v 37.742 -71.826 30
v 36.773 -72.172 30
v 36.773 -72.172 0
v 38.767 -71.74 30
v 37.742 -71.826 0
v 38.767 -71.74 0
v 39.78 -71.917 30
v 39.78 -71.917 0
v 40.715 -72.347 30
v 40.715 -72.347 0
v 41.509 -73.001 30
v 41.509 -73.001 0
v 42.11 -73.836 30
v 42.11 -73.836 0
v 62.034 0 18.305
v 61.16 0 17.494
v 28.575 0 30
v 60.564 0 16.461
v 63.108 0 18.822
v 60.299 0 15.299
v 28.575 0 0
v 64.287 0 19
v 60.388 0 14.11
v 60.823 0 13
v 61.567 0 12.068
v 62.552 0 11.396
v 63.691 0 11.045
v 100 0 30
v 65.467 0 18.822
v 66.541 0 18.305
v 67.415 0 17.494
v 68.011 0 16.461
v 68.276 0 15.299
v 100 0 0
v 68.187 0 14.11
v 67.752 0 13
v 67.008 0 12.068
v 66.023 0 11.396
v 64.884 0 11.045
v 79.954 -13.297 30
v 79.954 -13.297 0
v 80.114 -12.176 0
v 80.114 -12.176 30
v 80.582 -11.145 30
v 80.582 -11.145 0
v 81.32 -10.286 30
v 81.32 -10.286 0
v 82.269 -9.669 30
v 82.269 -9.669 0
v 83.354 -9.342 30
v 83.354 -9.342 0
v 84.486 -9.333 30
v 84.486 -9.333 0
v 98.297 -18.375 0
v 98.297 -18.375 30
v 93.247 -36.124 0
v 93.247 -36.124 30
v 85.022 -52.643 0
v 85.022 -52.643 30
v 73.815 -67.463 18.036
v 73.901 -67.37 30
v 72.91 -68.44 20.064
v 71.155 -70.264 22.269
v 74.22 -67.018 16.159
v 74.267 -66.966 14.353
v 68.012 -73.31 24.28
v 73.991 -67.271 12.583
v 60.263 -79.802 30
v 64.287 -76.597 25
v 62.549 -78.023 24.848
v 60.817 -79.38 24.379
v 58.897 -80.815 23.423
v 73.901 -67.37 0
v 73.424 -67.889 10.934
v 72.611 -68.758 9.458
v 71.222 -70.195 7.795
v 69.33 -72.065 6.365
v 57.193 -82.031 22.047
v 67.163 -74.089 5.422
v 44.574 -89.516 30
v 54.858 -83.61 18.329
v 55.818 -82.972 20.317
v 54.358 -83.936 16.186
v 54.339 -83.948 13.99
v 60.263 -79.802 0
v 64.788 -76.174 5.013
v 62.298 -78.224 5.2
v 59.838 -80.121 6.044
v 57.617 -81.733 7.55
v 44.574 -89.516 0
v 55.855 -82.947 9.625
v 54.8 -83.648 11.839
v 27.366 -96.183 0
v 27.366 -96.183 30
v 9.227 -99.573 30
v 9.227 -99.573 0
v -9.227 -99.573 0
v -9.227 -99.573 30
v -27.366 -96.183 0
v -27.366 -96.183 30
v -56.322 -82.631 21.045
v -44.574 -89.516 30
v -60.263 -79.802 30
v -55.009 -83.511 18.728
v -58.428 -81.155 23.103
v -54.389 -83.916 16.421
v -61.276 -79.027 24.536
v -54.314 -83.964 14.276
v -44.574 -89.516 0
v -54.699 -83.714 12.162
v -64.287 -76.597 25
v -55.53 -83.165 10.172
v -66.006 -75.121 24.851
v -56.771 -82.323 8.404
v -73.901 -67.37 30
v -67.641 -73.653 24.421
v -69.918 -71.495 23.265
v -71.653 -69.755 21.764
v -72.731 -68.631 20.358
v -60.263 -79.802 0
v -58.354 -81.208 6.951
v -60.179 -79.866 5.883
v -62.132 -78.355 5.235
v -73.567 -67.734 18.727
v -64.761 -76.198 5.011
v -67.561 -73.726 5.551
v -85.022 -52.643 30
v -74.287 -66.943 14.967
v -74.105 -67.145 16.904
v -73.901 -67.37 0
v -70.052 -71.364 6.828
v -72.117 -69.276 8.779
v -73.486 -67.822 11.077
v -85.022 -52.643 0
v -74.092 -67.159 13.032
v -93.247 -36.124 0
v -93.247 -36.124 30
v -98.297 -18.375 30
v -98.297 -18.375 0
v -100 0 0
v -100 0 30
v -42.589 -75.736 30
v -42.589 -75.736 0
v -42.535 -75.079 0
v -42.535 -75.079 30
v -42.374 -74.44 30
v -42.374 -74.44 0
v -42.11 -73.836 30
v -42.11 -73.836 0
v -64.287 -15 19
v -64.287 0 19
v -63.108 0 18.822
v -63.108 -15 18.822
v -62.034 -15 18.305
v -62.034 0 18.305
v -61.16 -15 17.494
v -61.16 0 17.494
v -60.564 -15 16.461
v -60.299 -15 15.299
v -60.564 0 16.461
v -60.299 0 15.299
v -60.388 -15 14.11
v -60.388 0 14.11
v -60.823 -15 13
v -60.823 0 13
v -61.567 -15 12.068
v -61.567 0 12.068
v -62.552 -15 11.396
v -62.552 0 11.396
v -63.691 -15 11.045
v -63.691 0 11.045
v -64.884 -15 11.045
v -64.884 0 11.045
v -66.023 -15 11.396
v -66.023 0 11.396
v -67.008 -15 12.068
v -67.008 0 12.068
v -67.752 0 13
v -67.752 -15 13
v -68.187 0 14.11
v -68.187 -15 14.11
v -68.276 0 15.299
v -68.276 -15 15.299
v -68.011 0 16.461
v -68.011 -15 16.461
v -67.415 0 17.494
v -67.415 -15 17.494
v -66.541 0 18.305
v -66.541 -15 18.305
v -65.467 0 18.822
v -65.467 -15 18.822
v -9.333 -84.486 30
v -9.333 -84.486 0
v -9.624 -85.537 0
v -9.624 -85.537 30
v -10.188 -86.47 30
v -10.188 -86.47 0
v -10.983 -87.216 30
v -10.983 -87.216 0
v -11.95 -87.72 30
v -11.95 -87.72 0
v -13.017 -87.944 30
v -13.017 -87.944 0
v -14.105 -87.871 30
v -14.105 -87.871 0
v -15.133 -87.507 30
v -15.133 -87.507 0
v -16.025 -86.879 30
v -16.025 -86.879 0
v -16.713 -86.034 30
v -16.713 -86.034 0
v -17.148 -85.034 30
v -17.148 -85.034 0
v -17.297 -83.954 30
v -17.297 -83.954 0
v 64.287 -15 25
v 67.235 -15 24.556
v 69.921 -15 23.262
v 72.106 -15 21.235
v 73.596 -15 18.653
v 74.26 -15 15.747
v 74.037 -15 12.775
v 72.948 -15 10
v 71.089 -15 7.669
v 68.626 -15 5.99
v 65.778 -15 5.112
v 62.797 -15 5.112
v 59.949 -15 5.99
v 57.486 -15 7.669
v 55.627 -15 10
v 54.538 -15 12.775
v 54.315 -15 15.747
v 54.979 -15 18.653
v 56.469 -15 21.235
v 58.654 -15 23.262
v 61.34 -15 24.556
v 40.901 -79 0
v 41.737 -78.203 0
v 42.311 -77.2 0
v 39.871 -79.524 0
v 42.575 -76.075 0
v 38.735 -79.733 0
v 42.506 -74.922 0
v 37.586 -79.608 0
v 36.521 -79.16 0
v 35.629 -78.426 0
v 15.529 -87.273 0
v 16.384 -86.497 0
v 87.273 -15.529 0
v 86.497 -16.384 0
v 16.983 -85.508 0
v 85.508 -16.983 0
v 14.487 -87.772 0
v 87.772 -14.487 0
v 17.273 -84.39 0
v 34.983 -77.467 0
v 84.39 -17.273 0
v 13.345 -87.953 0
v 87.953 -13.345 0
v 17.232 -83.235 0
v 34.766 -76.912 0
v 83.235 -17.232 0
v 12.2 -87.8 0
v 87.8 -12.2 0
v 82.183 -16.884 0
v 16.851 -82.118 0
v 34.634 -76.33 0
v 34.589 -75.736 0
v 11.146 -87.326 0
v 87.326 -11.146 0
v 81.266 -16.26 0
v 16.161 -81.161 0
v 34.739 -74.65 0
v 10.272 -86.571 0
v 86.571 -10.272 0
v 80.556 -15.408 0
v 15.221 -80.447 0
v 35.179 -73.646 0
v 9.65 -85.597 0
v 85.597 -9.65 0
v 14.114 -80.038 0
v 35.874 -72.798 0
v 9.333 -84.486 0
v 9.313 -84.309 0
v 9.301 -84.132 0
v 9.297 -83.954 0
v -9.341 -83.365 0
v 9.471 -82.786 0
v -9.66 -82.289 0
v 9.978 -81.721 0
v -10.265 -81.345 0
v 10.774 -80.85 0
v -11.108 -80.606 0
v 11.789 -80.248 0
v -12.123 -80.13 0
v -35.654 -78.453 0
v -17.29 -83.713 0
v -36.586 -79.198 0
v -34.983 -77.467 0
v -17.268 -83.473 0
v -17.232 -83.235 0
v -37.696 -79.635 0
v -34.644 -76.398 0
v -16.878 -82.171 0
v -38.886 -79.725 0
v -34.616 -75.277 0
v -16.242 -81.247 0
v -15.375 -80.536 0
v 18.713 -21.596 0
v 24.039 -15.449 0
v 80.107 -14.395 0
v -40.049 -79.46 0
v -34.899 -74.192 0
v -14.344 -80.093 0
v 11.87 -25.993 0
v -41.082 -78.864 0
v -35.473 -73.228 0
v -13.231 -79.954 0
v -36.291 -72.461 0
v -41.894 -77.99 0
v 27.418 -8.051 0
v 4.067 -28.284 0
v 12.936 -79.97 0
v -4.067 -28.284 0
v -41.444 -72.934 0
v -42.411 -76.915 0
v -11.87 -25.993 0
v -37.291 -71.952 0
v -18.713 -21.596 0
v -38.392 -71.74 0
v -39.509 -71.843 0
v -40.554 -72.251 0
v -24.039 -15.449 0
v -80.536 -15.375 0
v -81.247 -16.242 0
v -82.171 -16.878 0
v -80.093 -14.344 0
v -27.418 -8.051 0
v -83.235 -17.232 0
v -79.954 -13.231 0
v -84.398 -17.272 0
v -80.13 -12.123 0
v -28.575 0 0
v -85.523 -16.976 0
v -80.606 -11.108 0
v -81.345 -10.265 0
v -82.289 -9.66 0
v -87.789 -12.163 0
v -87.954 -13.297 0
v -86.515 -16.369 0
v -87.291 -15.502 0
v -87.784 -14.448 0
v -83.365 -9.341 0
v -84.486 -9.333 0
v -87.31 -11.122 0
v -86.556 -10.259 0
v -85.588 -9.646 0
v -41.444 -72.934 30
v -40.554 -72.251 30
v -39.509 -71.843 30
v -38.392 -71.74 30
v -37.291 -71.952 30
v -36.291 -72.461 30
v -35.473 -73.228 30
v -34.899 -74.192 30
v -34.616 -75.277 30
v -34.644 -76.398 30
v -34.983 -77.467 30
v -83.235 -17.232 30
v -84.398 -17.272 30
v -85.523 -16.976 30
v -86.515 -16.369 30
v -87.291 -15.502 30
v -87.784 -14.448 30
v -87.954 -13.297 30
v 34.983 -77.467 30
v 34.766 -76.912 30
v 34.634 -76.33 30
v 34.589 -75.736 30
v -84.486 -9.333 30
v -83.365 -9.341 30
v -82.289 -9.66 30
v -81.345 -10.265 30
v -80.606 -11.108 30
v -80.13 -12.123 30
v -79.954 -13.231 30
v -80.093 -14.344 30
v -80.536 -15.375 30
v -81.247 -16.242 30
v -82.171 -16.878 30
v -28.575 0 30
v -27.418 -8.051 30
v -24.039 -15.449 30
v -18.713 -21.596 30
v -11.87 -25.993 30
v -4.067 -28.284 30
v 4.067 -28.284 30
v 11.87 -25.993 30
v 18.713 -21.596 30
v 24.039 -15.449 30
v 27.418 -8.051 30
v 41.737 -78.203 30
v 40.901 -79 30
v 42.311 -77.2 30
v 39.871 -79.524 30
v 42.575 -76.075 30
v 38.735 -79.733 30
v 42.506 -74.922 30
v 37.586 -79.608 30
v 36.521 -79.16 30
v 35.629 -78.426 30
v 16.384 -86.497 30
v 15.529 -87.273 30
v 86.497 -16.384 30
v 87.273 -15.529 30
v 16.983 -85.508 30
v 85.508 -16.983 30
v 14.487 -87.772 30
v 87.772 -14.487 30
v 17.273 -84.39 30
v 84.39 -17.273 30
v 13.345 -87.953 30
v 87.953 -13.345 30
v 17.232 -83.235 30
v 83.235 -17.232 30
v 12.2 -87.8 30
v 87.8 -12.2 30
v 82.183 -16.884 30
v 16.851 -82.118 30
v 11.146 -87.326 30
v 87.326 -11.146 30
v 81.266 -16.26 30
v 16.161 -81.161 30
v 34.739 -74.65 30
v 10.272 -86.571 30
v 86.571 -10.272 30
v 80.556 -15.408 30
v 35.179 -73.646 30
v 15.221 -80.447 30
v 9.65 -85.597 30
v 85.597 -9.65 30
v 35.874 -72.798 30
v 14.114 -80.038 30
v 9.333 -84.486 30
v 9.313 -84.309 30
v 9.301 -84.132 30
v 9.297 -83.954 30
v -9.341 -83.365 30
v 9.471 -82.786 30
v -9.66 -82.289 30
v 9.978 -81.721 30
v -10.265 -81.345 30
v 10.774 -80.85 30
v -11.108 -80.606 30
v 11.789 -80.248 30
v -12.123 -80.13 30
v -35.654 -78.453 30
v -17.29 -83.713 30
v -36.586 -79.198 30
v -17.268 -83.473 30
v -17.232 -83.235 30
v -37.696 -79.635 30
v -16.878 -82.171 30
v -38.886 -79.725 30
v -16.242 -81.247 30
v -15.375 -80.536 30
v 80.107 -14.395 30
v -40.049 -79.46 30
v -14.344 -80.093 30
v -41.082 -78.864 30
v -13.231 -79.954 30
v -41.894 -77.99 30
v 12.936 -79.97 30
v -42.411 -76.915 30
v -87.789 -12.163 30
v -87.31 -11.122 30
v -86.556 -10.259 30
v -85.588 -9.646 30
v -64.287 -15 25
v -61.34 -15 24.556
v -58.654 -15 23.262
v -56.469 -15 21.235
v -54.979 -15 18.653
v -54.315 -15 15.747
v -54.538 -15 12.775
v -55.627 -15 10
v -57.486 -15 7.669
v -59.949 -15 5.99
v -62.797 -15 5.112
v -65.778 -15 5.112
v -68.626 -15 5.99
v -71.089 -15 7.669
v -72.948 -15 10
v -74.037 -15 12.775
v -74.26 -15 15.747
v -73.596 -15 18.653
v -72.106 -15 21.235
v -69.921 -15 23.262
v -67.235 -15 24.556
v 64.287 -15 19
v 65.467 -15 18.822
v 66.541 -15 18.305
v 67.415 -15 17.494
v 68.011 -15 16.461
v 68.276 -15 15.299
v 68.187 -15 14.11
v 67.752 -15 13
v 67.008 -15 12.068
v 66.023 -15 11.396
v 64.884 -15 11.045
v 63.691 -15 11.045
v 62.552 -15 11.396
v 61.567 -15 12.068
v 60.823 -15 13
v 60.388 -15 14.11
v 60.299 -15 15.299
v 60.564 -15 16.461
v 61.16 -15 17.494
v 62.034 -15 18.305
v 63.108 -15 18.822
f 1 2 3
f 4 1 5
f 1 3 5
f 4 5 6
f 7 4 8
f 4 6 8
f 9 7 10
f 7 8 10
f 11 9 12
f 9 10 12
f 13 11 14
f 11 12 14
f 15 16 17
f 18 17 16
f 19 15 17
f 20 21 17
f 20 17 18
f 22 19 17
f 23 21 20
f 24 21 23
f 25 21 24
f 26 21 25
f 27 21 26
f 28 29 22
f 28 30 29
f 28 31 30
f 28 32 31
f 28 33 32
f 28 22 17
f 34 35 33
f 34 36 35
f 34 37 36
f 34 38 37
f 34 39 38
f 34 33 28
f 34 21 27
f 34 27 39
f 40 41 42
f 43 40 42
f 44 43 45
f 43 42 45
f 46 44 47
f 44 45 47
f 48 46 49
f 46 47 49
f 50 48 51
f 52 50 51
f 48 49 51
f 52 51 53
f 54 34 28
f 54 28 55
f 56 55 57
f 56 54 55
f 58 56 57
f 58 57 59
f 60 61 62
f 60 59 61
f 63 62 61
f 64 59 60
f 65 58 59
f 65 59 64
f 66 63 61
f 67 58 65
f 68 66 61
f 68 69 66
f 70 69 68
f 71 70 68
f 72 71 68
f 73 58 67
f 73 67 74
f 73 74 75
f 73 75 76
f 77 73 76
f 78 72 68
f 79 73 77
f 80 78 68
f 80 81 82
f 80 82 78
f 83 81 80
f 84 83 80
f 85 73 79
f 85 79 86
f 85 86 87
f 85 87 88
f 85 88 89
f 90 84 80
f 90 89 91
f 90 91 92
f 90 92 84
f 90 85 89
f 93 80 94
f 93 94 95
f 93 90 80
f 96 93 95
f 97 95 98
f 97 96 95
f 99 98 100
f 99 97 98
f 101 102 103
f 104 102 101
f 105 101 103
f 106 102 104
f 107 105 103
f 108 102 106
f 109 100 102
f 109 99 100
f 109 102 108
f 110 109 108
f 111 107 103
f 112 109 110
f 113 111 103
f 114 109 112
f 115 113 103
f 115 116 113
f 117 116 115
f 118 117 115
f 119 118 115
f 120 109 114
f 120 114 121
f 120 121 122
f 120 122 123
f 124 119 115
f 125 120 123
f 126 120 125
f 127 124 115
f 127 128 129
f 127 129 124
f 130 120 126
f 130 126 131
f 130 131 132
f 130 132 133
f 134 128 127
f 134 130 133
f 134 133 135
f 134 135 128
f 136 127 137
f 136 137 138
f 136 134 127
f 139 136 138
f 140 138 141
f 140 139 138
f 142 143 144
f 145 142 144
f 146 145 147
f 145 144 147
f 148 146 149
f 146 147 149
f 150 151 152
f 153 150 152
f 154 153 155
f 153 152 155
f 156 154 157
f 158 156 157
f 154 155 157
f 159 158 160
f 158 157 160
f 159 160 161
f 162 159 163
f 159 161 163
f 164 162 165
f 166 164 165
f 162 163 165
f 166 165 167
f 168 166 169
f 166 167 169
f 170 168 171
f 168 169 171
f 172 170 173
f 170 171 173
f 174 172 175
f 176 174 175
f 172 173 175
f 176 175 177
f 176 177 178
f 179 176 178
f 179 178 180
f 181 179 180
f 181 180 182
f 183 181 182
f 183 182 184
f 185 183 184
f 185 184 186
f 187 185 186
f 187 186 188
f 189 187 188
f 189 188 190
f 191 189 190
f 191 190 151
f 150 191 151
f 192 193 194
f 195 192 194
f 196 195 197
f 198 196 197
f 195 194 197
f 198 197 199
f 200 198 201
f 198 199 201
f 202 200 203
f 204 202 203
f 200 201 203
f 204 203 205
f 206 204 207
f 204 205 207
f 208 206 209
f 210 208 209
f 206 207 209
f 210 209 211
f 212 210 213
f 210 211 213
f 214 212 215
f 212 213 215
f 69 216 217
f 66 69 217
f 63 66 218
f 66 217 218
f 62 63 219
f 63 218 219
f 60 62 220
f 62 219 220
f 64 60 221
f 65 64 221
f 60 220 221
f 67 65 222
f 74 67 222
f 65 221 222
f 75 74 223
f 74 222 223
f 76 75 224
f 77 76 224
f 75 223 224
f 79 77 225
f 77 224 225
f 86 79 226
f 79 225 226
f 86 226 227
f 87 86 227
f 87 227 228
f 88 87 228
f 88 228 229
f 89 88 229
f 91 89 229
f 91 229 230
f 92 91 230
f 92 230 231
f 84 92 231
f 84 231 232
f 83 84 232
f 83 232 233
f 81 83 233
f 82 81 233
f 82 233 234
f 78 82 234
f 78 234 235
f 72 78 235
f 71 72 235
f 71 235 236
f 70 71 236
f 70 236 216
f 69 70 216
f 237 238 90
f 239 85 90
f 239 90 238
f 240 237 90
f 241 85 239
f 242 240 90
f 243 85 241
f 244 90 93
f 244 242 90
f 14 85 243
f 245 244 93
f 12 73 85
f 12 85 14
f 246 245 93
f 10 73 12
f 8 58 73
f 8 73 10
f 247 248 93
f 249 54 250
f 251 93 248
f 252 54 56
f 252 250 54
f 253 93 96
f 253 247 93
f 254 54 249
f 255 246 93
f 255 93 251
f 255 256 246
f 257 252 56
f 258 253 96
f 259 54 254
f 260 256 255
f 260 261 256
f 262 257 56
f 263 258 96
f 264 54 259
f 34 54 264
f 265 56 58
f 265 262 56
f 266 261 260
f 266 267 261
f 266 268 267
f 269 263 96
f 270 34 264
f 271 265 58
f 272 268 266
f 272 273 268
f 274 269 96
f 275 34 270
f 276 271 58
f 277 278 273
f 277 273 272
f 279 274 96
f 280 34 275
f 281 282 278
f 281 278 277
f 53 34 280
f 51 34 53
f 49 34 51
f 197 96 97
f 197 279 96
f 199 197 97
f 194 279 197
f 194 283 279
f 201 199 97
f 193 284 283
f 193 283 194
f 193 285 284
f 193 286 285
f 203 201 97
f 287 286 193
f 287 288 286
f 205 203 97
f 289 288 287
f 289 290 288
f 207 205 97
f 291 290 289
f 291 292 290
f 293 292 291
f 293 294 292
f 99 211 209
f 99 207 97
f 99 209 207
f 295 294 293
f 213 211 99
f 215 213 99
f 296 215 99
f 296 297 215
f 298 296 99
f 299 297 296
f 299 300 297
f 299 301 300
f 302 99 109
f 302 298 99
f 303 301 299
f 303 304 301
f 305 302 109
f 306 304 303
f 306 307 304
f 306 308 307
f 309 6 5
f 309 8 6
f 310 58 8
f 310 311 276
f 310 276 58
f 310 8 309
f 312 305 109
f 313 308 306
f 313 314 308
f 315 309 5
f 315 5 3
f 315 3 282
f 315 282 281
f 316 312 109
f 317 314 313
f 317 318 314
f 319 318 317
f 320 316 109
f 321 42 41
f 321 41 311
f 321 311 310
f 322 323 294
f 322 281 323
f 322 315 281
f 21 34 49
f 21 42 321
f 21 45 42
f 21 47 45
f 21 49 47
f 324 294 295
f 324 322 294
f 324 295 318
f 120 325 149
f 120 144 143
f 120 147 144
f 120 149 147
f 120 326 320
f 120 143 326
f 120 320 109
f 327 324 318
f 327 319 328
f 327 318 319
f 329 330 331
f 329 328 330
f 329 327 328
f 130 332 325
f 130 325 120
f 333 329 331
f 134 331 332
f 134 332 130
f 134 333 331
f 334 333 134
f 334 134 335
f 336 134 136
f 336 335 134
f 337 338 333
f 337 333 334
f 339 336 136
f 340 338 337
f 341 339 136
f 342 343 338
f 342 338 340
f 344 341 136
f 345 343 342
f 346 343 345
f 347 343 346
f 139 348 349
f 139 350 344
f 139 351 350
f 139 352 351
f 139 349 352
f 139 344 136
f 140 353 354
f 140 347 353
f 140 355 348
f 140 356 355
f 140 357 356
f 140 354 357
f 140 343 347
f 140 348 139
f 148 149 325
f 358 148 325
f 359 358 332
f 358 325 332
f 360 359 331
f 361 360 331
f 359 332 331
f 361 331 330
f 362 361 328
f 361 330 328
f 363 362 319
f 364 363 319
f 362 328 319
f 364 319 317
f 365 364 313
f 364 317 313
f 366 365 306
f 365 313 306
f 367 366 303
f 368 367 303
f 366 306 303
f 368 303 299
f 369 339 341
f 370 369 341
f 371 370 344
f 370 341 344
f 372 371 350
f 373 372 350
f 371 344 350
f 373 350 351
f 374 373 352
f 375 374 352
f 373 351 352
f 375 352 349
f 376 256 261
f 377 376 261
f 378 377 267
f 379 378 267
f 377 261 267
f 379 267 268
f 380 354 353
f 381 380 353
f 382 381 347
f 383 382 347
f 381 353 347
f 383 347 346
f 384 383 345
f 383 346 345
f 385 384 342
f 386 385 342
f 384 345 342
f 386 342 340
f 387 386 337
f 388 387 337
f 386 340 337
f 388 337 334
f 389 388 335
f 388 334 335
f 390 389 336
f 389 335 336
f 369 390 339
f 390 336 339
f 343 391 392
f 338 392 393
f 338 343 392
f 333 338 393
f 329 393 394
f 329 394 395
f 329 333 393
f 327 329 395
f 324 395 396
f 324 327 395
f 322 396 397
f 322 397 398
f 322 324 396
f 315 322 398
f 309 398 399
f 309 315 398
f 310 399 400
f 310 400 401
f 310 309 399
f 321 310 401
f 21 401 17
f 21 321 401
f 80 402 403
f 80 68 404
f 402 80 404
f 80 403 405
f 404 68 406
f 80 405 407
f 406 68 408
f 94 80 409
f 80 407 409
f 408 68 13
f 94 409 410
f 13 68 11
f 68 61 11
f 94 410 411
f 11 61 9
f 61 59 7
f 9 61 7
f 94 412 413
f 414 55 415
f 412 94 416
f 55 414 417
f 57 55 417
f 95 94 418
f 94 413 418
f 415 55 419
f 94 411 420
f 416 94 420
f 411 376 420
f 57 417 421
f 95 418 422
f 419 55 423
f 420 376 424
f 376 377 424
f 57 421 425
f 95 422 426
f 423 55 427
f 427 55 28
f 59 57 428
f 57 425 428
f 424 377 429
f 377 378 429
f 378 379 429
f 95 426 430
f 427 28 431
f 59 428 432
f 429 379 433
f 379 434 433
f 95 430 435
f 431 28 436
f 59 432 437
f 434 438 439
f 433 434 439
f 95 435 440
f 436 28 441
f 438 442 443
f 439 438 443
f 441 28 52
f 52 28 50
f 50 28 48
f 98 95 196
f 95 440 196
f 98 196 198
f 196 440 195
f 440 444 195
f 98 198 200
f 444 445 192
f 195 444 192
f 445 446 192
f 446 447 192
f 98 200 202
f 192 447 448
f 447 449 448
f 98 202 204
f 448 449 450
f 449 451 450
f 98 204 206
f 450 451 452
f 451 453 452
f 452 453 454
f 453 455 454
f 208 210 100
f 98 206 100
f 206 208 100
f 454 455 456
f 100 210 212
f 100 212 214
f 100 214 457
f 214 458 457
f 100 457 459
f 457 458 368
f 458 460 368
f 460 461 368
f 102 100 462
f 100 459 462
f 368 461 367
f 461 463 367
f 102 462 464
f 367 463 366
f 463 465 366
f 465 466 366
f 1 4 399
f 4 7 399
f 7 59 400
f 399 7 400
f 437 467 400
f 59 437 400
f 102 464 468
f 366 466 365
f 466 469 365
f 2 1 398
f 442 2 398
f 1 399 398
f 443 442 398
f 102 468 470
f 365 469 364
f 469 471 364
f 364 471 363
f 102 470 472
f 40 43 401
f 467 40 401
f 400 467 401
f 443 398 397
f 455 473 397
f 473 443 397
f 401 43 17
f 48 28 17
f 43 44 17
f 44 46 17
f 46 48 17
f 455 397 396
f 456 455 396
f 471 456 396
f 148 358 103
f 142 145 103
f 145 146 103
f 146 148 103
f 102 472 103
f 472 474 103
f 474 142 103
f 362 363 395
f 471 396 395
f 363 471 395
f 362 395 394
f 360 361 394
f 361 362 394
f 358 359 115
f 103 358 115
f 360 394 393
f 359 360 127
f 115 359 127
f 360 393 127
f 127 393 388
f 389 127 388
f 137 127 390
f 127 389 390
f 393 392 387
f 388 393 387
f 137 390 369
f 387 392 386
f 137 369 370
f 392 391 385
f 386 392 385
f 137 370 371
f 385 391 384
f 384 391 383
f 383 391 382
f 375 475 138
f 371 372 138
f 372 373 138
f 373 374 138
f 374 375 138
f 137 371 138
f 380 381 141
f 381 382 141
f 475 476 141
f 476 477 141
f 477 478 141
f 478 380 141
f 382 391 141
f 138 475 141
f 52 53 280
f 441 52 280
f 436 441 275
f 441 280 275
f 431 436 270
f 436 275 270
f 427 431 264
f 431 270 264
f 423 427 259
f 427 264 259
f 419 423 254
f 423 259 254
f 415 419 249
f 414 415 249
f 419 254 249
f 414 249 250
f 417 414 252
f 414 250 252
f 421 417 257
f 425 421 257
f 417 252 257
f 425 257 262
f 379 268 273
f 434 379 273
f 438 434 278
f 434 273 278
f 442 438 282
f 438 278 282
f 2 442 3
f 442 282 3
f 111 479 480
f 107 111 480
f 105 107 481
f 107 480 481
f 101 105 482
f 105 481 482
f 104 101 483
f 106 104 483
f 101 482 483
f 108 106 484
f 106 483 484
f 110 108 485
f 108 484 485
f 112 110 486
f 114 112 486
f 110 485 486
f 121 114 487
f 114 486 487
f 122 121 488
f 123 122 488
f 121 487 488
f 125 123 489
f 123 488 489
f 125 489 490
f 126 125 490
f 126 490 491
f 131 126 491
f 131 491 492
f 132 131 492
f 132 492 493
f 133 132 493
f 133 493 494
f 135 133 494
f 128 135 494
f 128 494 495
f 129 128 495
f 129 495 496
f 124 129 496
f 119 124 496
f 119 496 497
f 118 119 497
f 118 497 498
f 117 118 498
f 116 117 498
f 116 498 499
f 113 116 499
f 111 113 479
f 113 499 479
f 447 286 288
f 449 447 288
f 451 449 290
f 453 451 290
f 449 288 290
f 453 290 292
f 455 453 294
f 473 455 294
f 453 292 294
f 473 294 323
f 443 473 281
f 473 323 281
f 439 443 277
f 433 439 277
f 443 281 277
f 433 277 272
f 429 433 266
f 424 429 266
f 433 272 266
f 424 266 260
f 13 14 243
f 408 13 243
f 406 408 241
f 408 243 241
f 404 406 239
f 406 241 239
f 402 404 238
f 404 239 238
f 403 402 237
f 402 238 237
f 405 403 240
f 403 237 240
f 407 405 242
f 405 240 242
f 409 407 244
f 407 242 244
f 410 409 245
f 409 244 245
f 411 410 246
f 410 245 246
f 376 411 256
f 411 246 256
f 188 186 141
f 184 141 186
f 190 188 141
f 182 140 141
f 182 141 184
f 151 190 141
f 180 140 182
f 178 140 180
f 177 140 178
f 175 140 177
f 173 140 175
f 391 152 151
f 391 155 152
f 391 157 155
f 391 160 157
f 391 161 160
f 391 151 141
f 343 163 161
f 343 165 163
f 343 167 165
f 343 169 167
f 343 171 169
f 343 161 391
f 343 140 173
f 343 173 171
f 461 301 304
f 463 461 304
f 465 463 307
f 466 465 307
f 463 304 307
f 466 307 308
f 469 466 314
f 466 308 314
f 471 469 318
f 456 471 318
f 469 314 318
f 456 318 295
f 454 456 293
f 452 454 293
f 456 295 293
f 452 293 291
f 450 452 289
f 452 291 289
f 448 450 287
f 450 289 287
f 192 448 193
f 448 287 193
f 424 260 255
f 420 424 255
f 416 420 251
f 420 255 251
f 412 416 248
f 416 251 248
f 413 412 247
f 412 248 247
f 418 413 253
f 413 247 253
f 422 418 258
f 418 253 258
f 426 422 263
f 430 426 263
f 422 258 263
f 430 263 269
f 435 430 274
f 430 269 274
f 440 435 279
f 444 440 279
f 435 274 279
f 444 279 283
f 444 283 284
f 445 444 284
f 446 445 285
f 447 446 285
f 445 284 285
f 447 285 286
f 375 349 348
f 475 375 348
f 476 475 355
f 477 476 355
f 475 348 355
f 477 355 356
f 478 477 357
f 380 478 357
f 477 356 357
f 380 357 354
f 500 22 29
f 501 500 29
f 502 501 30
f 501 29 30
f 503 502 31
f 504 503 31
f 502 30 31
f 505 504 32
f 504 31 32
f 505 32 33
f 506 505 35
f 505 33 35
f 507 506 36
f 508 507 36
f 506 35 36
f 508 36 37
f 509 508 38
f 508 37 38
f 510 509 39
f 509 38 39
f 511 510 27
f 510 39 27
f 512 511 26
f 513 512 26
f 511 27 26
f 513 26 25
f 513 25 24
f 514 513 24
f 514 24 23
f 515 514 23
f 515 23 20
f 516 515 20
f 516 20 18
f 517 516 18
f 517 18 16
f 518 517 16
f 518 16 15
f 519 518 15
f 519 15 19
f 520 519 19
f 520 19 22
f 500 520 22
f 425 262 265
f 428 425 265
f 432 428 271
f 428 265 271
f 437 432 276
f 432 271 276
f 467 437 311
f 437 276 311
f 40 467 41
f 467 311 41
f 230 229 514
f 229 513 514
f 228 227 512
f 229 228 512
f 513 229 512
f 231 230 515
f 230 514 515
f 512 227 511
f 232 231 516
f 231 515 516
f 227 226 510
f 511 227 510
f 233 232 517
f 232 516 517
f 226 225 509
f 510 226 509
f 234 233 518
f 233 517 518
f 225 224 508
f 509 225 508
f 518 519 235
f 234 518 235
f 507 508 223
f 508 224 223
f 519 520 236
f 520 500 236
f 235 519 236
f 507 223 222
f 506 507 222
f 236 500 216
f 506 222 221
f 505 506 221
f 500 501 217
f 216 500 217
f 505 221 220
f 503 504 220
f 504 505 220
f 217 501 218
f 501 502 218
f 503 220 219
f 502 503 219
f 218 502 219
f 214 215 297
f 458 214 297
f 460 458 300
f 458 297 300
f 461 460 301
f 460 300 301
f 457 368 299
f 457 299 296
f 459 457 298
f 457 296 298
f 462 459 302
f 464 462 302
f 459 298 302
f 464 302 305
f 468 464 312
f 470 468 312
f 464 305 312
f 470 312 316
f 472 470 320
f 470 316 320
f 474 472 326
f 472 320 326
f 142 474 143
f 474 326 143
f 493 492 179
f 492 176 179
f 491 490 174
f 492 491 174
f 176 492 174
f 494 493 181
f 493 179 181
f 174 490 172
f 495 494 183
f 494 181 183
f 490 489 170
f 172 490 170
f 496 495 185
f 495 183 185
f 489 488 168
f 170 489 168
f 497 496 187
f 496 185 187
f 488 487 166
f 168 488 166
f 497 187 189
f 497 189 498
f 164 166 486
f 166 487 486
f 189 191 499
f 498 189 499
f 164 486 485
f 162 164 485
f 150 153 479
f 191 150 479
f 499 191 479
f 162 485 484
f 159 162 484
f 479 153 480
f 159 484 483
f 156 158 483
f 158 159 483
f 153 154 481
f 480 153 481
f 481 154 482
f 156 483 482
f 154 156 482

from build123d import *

# Parameters (mm, degrees)
DODANIE_WYCI_GNI_CIE1_DEPTH = 30
SZKIC2_R                    = 4
WYTNIJ_WYCI_GNI_CIE1_DEPTH  = 145.568322948
SZKIC3_R                    = 10
WYTNIJ_WYCI_GNI_CIE2_DEPTH  = 135.629120338
WYTNIJ_WYCI_GNI_CIE5_DEPTH  = 145.568323107


with BuildPart() as part:
    # Szkic1 → Dodanie-wyciągnięcie1 (new body)
    with BuildSketch(Plane.XY):
        with BuildLine():
            Line((-100, 0), (-28.575, 0))
            ThreePointArc((-28.575, 0), (0, -28.575), (28.575, 0))
            Line((28.575, 0), (100, 0))
            ThreePointArc((100, 0), (0, -100), (-100, 0))
        make_face()
    extrude(amount=DODANIE_WYCI_GNI_CIE1_DEPTH)

    # Szkic2 → Wytnij-wyciągnięcie1 (cut, through all)
    with BuildSketch(Plane(origin=(0, 0, 0), x_dir=(1, 0, 0), z_dir=(0, 1, 0))):
        with Locations(Location((-64.2875, -15, 0), (0, 0, 270))):
            Circle(SZKIC2_R)
        with Locations(Location((64.2875, -15, 0), (0, 0, 270))):
            Circle(SZKIC2_R)
    extrude(amount=-WYTNIJ_WYCI_GNI_CIE1_DEPTH, mode=Mode.SUBTRACT)

    # Szkic3 → Wytnij-wyciągnięcie2 (cut, through all)
    with BuildSketch(Plane(origin=(0, -15, 0), x_dir=(1, 0, 0), z_dir=(0, 1, 0))):
        with Locations(Location((64.2875, -15, 0), (0, 0, 270))):
            Circle(SZKIC3_R)
        with Locations(Location((-64.2875, -15, 0), (0, 0, 270))):
            Circle(SZKIC3_R)
    extrude(amount=-WYTNIJ_WYCI_GNI_CIE2_DEPTH, mode=Mode.SUBTRACT)

    # Szkic5 → Wytnij-wyciągnięcie5 (cut, through all)
    with BuildSketch(Plane(origin=(0, 0, 0), x_dir=(-1, 0, 0), z_dir=(0, 0, -1))):
        with BuildLine():
            ThreePointArc((84.486114669, -9.332546708), (80.002755588, -12.671191668), (83.234985426, -17.231865861))
            ThreePointArc((83.234985426, -17.231865861), (83.953508951, -13.296929528), (84.486114669, -9.332546708))
        make_face()
        with BuildLine():
            ThreePointArc((84.486114669, -9.332546708), (83.953508951, -13.296929528), (83.234985426, -17.231865861))
            ThreePointArc((83.234985426, -17.231865861), (86.515335048, -16.368907238), (87.953508951, -13.296929528))
            ThreePointArc((87.953508951, -13.296929528), (86.964357907, -10.663530857), (84.486114669, -9.332546708))
        make_face()
        with BuildLine():
            ThreePointArc((84.486114669, -9.332546708), (80.002755588, -12.671191668), (83.234985426, -17.231865861))
            ThreePointArc((83.234985426, -17.231865861), (83.953508951, -13.296929528), (84.486114669, -9.332546708))
        make_face()
        with BuildLine():
            ThreePointArc((84.486114669, -9.332546708), (83.953508951, -13.296929528), (83.234985426, -17.231865861))
            ThreePointArc((83.234985426, -17.231865861), (86.515335048, -16.368907238), (87.953508951, -13.296929528))
            ThreePointArc((87.953508951, -13.296929528), (86.964357907, -10.663530857), (84.486114669, -9.332546708))
        make_face()
        with BuildLine():
            ThreePointArc((42.109503339, -73.836235878), (36.773230479, -72.171528459), (34.983424582, -77.467154359))
            ThreePointArc((34.983424582, -77.467154359), (38.589192478, -75.735554556), (42.109503339, -73.836235878))
        make_face()
        with BuildLine():
            ThreePointArc((42.109503339, -73.836235878), (38.589192478, -75.735554556), (34.983424582, -77.467154359))
            ThreePointArc((34.983424582, -77.467154359), (39.477147549, -79.635751447), (42.589192478, -75.735554556))
            ThreePointArc((42.589192478, -75.735554556), (42.46741652, -74.756075981), (42.109503339, -73.836235878))
        make_face()
        with BuildLine():
            ThreePointArc((42.109503339, -73.836235878), (36.773230479, -72.171528459), (34.983424582, -77.467154359))
            ThreePointArc((34.983424582, -77.467154359), (38.589192478, -75.735554556), (42.109503339, -73.836235878))
        make_face()
        with BuildLine():
            ThreePointArc((42.109503339, -73.836235878), (38.589192478, -75.735554556), (34.983424582, -77.467154359))
            ThreePointArc((34.983424582, -77.467154359), (39.477147549, -79.635751447), (42.589192478, -75.735554556))
            ThreePointArc((42.589192478, -75.735554556), (42.46741652, -74.756075981), (42.109503339, -73.836235878))
        make_face()
        with BuildLine():
            ThreePointArc((17.231865861, -83.234985426), (12.671191668, -80.002755588), (9.332546708, -84.486114669))
            ThreePointArc((9.332546708, -84.486114669), (13.296929528, -83.953508951), (17.231865861, -83.234985426))
        make_face()
        with BuildLine():
            ThreePointArc((17.231865861, -83.234985426), (13.296929528, -83.953508951), (9.332546708, -84.486114669))
            ThreePointArc((9.332546708, -84.486114669), (13.563827184, -87.944594723), (17.296929528, -83.953508951))
            ThreePointArc((17.296929528, -83.953508951), (17.280630404, -83.592777286), (17.231865861, -83.234985426))
        make_face()
        with BuildLine():
            ThreePointArc((17.231865861, -83.234985426), (12.671191668, -80.002755588), (9.332546708, -84.486114669))
            ThreePointArc((9.332546708, -84.486114669), (13.296929528, -83.953508951), (17.231865861, -83.234985426))
        make_face()
        with BuildLine():
            ThreePointArc((17.231865861, -83.234985426), (13.296929528, -83.953508951), (9.332546708, -84.486114669))
            ThreePointArc((9.332546708, -84.486114669), (13.563827184, -87.944594723), (17.296929528, -83.953508951))
            ThreePointArc((17.296929528, -83.953508951), (17.280630404, -83.592777286), (17.231865861, -83.234985426))
        make_face()
        with BuildLine():
            ThreePointArc((-17.231865861, -83.234985426), (-13.296929528, -83.953508951), (-9.332546708, -84.486114669))
            ThreePointArc((-9.332546708, -84.486114669), (-9.305843756, -84.220406607), (-9.296929528, -83.953508951))
            ThreePointArc((-9.296929528, -83.953508951), (-12.936197864, -79.969808075), (-17.231865861, -83.234985426))
        make_face()
        with BuildLine():
            ThreePointArc((-17.231865861, -83.234985426), (-13.922667389, -87.904262313), (-9.332546708, -84.486114669))
            ThreePointArc((-9.332546708, -84.486114669), (-13.296929528, -83.953508951), (-17.231865861, -83.234985426))
        make_face()
        with BuildLine():
            ThreePointArc((-17.231865861, -83.234985426), (-13.296929528, -83.953508951), (-9.332546708, -84.486114669))
            ThreePointArc((-9.332546708, -84.486114669), (-9.305843756, -84.220406607), (-9.296929528, -83.953508951))
            ThreePointArc((-9.296929528, -83.953508951), (-12.936197864, -79.969808075), (-17.231865861, -83.234985426))
        make_face()
        with BuildLine():
            ThreePointArc((-17.231865861, -83.234985426), (-13.922667389, -87.904262313), (-9.332546708, -84.486114669))
            ThreePointArc((-9.332546708, -84.486114669), (-13.296929528, -83.953508951), (-17.231865861, -83.234985426))
        make_face()
        with BuildLine():
            ThreePointArc((-34.983424582, -77.467154359), (-36.796495821, -76.622567794), (-38.589192478, -75.735554556))
            ThreePointArc((-38.589192478, -75.735554556), (-40.360521918, -74.806605795), (-42.109503339, -73.836235878))
            ThreePointArc((-42.109503339, -73.836235878), (-40.405154477, -79.299580653), (-34.983424582, -77.467154359))
        make_face()
        with BuildLine():
            ThreePointArc((-34.589192478, -75.735554556), (-35.17863182, -73.645560297), (-36.773230479, -72.171528459))
            Line((-36.773230479, -72.171528459), (-38.589192478, -75.735554556))
            ThreePointArc((-38.589192478, -75.735554556), (-36.796495821, -76.622567794), (-34.983424582, -77.467154359))
            ThreePointArc((-34.983424582, -77.467154359), (-34.688995586, -76.623509627), (-34.589192478, -75.735554556))
        make_face()
        with BuildLine():
            Line((-38.589192478, -75.735554556), (-36.773230479, -72.171528459))
            ThreePointArc((-36.773230479, -72.171528459), (-39.780416201, -71.917048822), (-42.109503339, -73.836235878))
            ThreePointArc((-42.109503339, -73.836235878), (-40.360521918, -74.806605795), (-38.589192478, -75.735554556))
        make_face()
        with BuildLine():
            ThreePointArc((-34.589192478, -75.735554556), (-35.17863182, -73.645560297), (-36.773230479, -72.171528459))
            Line((-36.773230479, -72.171528459), (-38.589192478, -75.735554556))
            ThreePointArc((-38.589192478, -75.735554556), (-36.796495821, -76.622567794), (-34.983424582, -77.467154359))
            ThreePointArc((-34.983424582, -77.467154359), (-34.688995586, -76.623509627), (-34.589192478, -75.735554556))
        make_face()
        with BuildLine():
            Line((-38.589192478, -75.735554556), (-36.773230479, -72.171528459))
            ThreePointArc((-36.773230479, -72.171528459), (-39.780416201, -71.917048822), (-42.109503339, -73.836235878))
            ThreePointArc((-42.109503339, -73.836235878), (-40.360521918, -74.806605795), (-38.589192478, -75.735554556))
        make_face()
        with BuildLine():
            ThreePointArc((-84.486114669, -9.332546708), (-87.904262313, -13.922667389), (-83.234985426, -17.231865861))
            ThreePointArc((-83.234985426, -17.231865861), (-83.953508951, -13.296929528), (-84.486114669, -9.332546708))
        make_face()
        with BuildLine():
            ThreePointArc((-84.486114669, -9.332546708), (-83.953508951, -13.296929528), (-83.234985426, -17.231865861))
            ThreePointArc((-83.234985426, -17.231865861), (-80.881531241, -15.858755625), (-79.953508951, -13.296929528))
            ThreePointArc((-79.953508951, -13.296929528), (-81.320110279, -10.286080572), (-84.486114669, -9.332546708))
        make_face()
        with BuildLine():
            ThreePointArc((-84.486114669, -9.332546708), (-87.904262313, -13.922667389), (-83.234985426, -17.231865861))
            ThreePointArc((-83.234985426, -17.231865861), (-83.953508951, -13.296929528), (-84.486114669, -9.332546708))
        make_face()
        with BuildLine():
            ThreePointArc((-84.486114669, -9.332546708), (-83.953508951, -13.296929528), (-83.234985426, -17.231865861))
            ThreePointArc((-83.234985426, -17.231865861), (-80.881531241, -15.858755625), (-79.953508951, -13.296929528))
            ThreePointArc((-79.953508951, -13.296929528), (-81.320110279, -10.286080572), (-84.486114669, -9.332546708))
        make_face()
    extrude(amount=-WYTNIJ_WYCI_GNI_CIE5_DEPTH, mode=Mode.SUBTRACT)


solid = part.part
